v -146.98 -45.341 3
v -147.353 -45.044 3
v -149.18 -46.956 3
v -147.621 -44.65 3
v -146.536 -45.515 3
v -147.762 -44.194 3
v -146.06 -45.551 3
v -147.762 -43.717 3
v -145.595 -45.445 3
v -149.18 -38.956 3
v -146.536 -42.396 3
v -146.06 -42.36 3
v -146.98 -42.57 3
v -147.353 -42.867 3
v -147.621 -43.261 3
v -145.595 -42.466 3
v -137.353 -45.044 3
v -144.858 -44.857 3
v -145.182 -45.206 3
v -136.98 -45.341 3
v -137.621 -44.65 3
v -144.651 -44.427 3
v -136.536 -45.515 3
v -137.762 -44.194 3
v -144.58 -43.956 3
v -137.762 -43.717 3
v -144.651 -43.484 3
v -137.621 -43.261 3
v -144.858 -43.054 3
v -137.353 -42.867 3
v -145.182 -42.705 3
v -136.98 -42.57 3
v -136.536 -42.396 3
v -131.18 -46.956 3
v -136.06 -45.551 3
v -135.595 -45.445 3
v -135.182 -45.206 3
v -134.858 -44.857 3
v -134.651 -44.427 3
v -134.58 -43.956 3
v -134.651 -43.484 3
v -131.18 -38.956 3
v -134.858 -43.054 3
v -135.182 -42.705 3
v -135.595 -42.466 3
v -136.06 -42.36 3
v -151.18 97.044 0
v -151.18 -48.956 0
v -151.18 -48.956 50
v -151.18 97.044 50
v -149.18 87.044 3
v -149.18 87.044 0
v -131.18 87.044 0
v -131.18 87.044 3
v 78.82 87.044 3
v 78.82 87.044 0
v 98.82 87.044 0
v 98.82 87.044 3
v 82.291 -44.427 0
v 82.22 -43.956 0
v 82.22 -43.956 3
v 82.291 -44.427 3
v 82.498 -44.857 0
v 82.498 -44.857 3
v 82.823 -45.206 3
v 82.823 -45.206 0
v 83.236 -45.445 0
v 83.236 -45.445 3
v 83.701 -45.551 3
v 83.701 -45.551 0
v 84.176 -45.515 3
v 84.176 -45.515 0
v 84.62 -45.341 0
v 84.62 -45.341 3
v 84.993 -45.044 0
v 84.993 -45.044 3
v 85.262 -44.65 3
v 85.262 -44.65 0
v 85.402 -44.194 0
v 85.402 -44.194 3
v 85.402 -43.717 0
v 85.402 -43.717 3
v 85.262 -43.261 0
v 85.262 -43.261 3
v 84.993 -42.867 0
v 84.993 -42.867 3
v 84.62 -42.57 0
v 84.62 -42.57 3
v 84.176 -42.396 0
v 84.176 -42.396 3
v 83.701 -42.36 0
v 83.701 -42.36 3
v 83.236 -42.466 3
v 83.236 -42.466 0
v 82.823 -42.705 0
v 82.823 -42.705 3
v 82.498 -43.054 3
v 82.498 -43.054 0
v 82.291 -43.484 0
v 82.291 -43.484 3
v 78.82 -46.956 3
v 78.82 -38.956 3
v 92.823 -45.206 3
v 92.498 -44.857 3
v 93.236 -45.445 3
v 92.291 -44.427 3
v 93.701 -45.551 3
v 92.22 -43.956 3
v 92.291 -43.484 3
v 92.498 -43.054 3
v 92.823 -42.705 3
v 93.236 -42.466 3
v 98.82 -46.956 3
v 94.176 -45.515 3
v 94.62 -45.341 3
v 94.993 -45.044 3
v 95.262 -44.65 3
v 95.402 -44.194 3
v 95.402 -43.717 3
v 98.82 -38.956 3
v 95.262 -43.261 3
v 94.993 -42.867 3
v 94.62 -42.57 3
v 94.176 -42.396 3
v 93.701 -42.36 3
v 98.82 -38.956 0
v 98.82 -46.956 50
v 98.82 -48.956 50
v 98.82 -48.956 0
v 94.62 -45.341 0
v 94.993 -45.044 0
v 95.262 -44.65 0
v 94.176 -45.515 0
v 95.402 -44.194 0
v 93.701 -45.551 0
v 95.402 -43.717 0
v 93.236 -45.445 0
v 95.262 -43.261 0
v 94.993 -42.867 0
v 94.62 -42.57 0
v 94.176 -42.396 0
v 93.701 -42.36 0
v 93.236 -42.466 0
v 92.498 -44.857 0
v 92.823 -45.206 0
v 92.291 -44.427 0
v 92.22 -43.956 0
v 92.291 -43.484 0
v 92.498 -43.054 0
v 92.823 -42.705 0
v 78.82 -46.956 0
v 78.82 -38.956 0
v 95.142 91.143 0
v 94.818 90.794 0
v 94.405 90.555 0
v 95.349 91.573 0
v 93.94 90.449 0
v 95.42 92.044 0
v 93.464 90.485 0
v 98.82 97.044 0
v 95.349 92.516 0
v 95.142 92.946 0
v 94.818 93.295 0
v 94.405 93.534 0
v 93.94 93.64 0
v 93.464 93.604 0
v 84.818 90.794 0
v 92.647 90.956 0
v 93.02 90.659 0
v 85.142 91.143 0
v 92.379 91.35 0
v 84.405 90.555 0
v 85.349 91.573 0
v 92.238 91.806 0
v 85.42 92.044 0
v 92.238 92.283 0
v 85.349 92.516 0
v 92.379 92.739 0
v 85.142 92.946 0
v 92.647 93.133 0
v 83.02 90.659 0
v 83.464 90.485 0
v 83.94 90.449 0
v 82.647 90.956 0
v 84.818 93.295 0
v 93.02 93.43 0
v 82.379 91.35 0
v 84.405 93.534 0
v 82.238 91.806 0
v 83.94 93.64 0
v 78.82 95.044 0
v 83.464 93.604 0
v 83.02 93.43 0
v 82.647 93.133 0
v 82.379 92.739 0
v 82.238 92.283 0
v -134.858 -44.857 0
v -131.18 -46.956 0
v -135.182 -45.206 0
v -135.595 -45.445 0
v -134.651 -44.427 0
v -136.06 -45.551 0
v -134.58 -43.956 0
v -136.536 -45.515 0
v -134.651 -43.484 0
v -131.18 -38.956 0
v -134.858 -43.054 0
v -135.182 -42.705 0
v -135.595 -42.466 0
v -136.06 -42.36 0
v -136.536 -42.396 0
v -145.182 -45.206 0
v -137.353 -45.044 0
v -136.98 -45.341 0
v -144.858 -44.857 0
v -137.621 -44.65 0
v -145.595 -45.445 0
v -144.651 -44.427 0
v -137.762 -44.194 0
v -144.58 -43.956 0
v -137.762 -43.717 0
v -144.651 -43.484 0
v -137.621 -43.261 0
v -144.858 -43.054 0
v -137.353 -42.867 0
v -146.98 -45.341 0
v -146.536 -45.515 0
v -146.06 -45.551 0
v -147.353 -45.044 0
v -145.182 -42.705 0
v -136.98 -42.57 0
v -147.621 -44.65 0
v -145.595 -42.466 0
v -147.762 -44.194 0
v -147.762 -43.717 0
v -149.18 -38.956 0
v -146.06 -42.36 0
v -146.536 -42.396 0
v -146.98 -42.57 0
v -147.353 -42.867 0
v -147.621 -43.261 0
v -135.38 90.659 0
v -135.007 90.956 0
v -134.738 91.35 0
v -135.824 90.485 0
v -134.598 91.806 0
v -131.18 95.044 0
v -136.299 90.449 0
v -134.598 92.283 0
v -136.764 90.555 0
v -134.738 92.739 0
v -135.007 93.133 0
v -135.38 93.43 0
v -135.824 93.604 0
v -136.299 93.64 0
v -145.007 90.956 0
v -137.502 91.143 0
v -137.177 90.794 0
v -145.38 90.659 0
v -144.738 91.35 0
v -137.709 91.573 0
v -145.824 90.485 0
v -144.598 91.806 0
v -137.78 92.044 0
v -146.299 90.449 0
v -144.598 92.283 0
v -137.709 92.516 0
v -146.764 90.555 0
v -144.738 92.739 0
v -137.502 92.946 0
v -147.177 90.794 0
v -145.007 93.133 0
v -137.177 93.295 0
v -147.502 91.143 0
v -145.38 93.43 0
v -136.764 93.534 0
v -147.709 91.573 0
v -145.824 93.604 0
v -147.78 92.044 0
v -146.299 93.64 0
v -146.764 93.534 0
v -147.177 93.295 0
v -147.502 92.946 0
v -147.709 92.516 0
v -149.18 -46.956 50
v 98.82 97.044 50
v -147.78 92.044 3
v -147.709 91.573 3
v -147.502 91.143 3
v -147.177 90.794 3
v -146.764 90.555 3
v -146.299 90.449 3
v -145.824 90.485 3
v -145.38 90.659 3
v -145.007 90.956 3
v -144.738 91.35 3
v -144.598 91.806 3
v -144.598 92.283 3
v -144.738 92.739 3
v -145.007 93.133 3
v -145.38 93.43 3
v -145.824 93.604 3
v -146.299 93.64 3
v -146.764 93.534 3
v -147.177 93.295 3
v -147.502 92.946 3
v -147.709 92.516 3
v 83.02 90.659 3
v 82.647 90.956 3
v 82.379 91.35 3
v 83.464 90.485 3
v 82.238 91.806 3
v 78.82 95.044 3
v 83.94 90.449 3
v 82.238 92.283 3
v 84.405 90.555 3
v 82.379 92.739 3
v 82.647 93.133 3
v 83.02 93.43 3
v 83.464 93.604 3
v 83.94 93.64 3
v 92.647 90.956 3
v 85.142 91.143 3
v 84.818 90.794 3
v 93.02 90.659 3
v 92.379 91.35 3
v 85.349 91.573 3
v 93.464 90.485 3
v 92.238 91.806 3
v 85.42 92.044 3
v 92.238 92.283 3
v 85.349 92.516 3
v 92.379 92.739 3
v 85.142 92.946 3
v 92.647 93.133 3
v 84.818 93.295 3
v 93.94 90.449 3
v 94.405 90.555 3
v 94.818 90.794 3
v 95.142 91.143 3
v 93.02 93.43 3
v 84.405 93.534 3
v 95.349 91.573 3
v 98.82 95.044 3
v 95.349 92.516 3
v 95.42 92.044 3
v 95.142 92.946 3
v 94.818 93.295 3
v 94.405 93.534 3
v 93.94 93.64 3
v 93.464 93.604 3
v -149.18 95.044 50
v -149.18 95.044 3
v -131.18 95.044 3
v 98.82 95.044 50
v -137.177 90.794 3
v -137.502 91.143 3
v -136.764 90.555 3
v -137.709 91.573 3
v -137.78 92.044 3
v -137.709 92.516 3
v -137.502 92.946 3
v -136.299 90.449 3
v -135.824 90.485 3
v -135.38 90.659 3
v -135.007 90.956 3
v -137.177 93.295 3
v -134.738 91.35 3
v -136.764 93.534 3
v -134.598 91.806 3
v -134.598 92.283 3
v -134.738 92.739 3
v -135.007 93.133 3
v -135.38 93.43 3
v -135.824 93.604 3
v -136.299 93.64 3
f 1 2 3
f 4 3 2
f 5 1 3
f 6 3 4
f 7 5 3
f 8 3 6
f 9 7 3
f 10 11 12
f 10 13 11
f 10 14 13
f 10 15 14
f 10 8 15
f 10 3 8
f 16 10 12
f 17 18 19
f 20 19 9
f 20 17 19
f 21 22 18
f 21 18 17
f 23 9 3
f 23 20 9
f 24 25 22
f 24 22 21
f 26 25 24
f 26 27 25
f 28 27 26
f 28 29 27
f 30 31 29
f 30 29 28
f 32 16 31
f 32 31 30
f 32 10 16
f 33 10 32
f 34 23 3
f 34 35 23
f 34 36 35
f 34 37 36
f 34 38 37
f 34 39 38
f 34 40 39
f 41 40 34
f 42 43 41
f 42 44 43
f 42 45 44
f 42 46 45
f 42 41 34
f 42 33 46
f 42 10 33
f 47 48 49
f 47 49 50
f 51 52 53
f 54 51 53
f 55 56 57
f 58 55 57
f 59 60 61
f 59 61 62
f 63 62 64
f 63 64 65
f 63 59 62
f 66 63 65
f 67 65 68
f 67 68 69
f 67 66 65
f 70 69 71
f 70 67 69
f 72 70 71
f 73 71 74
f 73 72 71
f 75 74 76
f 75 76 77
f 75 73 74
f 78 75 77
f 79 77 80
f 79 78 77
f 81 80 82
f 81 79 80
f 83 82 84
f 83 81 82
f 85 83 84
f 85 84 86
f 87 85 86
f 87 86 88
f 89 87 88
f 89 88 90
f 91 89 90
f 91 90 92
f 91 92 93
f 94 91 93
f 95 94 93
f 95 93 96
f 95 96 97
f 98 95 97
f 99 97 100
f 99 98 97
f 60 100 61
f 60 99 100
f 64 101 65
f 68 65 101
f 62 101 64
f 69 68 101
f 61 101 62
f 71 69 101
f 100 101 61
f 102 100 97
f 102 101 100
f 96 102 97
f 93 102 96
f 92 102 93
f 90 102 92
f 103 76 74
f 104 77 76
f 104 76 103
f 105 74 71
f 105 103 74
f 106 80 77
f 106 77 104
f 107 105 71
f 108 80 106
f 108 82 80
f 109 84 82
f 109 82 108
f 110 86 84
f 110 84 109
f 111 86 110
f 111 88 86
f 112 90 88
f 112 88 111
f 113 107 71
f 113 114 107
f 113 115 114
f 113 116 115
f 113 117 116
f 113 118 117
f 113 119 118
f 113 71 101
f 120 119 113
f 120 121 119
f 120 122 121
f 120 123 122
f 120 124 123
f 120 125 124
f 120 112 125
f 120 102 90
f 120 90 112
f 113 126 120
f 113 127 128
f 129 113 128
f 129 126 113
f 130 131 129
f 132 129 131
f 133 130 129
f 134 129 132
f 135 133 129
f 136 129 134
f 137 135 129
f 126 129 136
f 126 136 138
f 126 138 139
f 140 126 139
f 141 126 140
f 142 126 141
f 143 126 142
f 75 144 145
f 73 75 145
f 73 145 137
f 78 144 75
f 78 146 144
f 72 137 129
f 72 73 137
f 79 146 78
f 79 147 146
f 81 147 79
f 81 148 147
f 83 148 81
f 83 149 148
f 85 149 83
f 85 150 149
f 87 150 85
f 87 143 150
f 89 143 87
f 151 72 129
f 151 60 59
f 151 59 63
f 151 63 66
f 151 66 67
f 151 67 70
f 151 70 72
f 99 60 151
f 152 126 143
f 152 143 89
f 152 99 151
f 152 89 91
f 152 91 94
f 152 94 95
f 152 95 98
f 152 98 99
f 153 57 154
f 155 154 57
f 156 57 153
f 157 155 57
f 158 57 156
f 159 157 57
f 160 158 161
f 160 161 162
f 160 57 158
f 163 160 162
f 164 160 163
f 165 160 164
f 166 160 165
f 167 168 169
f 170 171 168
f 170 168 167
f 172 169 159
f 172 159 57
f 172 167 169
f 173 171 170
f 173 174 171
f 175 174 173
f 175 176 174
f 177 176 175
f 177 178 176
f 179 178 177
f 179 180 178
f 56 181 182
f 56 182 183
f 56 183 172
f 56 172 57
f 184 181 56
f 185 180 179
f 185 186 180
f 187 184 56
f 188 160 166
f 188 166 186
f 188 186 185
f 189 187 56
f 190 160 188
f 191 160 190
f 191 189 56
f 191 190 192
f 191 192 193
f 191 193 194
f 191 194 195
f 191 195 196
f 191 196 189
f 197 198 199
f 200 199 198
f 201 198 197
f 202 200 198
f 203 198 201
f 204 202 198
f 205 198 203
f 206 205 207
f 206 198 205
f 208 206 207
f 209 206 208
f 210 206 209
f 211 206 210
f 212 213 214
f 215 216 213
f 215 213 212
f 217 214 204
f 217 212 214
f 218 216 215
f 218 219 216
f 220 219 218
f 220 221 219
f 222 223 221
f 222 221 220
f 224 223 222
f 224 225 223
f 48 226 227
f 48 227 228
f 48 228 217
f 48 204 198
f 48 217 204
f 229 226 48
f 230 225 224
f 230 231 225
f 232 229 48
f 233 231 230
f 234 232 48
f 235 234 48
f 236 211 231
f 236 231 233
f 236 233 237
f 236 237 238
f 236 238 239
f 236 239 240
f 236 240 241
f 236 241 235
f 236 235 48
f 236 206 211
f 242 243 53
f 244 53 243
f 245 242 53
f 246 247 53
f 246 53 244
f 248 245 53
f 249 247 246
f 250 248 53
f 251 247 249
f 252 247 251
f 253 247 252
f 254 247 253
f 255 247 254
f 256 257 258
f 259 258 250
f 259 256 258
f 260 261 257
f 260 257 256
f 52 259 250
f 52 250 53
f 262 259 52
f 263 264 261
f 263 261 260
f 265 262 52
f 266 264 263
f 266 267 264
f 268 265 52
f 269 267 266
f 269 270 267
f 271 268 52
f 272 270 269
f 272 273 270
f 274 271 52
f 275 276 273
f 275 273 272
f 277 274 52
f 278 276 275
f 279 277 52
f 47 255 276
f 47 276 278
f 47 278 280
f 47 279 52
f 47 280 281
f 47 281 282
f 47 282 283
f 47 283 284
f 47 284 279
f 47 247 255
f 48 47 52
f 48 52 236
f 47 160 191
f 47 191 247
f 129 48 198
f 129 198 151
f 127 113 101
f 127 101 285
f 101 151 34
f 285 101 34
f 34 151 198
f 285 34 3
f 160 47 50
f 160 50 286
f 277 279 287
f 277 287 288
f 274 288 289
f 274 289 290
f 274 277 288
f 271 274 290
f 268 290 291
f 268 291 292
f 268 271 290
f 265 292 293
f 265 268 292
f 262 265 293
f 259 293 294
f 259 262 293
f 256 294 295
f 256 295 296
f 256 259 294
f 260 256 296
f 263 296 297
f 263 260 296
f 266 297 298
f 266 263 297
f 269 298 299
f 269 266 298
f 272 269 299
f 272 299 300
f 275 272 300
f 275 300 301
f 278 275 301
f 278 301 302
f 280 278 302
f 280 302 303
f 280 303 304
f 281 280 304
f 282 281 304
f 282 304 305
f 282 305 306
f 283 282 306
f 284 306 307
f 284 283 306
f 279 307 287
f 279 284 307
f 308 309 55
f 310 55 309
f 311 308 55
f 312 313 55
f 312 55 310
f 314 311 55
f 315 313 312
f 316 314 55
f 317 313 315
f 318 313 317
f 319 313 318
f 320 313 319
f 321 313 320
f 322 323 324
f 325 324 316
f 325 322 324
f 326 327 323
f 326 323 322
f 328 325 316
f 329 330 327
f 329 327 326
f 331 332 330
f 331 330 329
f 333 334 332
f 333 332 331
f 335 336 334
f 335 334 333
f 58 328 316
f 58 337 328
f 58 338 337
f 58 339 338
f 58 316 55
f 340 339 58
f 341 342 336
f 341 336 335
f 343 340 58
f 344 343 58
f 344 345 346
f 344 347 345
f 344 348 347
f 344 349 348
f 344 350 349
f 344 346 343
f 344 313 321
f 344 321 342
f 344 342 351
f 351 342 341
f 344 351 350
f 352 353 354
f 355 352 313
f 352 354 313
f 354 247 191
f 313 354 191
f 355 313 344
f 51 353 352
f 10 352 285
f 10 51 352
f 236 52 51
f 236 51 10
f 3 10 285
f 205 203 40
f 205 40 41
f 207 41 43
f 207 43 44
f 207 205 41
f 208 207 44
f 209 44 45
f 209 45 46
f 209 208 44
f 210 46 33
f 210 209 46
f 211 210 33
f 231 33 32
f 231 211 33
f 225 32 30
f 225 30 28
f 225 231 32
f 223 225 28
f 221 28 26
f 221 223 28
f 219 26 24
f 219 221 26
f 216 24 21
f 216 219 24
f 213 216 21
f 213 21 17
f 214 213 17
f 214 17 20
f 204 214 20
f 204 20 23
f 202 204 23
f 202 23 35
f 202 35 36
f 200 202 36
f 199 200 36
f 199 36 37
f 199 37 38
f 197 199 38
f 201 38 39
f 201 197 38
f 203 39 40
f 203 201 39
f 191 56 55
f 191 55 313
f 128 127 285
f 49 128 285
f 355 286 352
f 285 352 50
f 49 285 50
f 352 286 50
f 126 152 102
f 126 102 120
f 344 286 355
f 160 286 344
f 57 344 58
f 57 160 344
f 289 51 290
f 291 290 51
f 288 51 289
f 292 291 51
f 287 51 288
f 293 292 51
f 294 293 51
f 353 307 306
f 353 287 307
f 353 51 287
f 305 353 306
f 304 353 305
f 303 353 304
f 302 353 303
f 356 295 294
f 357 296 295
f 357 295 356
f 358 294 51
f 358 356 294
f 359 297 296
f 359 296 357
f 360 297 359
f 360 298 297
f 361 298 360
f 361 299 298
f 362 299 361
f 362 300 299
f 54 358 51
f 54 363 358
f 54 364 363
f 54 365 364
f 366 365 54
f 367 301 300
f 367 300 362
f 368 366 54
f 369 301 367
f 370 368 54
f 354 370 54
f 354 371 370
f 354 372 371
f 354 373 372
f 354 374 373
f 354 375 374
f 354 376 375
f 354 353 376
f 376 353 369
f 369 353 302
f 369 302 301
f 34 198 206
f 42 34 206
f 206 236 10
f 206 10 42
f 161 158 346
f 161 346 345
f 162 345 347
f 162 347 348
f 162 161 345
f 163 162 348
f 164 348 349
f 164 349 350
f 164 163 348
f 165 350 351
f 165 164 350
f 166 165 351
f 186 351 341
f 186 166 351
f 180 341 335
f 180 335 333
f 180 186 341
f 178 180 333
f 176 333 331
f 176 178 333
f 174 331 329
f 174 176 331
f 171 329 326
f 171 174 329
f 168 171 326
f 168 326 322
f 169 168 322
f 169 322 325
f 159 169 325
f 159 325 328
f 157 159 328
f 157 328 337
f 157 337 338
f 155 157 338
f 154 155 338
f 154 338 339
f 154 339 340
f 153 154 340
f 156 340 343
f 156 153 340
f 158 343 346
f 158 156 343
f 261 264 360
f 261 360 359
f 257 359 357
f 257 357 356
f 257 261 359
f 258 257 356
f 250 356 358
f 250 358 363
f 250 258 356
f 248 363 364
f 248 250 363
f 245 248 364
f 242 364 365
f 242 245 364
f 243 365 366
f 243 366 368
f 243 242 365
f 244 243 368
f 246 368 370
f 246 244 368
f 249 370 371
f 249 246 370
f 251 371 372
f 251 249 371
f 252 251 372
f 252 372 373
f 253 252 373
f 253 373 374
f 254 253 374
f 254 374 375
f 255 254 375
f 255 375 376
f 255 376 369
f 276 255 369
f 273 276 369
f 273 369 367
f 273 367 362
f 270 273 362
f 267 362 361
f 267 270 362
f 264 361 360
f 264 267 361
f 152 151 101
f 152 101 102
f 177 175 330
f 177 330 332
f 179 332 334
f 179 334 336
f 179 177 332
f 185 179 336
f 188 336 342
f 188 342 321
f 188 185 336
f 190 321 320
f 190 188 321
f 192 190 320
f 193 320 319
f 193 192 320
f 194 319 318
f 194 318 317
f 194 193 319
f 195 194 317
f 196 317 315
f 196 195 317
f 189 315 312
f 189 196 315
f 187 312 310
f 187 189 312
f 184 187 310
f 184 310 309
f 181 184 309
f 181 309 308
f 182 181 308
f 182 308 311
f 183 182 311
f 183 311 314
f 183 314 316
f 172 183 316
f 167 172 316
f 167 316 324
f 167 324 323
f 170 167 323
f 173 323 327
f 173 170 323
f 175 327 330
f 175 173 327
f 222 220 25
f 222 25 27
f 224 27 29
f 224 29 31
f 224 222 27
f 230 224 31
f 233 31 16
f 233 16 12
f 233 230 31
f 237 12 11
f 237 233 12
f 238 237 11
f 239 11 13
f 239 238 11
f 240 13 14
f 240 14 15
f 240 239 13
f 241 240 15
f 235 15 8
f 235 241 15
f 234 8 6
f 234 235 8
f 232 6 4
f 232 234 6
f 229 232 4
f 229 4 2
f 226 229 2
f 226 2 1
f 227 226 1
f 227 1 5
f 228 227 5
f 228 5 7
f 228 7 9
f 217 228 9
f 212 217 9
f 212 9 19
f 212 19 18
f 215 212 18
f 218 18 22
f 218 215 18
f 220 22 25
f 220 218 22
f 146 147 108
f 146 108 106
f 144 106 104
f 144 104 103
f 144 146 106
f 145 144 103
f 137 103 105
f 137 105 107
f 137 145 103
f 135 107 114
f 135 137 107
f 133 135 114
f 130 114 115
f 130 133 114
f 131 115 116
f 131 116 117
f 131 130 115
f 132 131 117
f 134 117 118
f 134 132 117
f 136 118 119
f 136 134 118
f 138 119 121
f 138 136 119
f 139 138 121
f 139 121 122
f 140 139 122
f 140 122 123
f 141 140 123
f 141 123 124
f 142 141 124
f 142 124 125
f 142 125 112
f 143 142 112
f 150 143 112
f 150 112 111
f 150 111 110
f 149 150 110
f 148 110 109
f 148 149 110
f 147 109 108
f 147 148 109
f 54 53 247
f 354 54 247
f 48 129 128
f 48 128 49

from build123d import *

# Parameters (mm, degrees)
EXTRUDE_1_DEPTH = 50
SKETCH_2_W      = 20
SKETCH_2_H      = 10
SKETCH_2_R      = 1.6
EXTRUDE_2_DEPTH = 3


with BuildPart() as part:
    # 草图1 → 凸台-拉伸1 (new body)
    with BuildSketch(Plane.XY):
        Polygon((-151.179701436, 97.04447756), (98.820298564, 97.04447756), (98.820298564, 95.04447756), (96.820298564, 95.04447756), (-149.179701436, 95.04447756), (-149.179701436, -46.95552244), (96.820298564, -46.95552244), (98.820298564, -46.95552244), (98.820298564, -48.95552244), (-151.179701436, -48.95552244), align=None)
    extrude(amount=EXTRUDE_1_DEPTH)

    # 草图2 → 凸台-拉伸2 (add)
    # profile 1 of 4: a face of its own
    with BuildSketch(Plane.XY):
        with Locations((-141.179701436, -43.95552244)):
            Rectangle(SKETCH_2_W, SKETCH_2_H)
        with Locations((-146.179701436, -43.95552244)):
            Circle(SKETCH_2_R, mode=Mode.SUBTRACT)
        with Locations((-136.179701436, -43.95552244)):
            Circle(SKETCH_2_R, mode=Mode.SUBTRACT)
    # profile 2 of 4: a face of its own
    with BuildSketch(Plane.XY):
        with Locations((88.820298564, -43.95552244)):
            Rectangle(SKETCH_2_W, SKETCH_2_H)
        with Locations((83.820298564, -43.95552244)):
            Circle(SKETCH_2_R, mode=Mode.SUBTRACT)
        with Locations((93.820298564, -43.95552244)):
            Circle(SKETCH_2_R, mode=Mode.SUBTRACT)
    # profile 3 of 4: a face of its own
    with BuildSketch(Plane.XY):
        with Locations((88.820298564, 92.04447756)):
            Rectangle(SKETCH_2_W, SKETCH_2_H)
        with Locations((93.820298564, 92.04447756)):
            Circle(SKETCH_2_R, mode=Mode.SUBTRACT)
        with Locations((83.820298564, 92.04447756)):
            Circle(SKETCH_2_R, mode=Mode.SUBTRACT)
    # profile 4 of 4: a face of its own
    with BuildSketch(Plane.XY):
        with Locations((-141.179701436, 92.04447756)):
            Rectangle(SKETCH_2_W, SKETCH_2_H)
        with Locations((-136.179701436, 92.04447756)):
            Circle(SKETCH_2_R, mode=Mode.SUBTRACT)
        with Locations((-146.179701436, 92.04447756)):
            Circle(SKETCH_2_R, mode=Mode.SUBTRACT)
    extrude(amount=EXTRUDE_2_DEPTH)


solid = part.part
